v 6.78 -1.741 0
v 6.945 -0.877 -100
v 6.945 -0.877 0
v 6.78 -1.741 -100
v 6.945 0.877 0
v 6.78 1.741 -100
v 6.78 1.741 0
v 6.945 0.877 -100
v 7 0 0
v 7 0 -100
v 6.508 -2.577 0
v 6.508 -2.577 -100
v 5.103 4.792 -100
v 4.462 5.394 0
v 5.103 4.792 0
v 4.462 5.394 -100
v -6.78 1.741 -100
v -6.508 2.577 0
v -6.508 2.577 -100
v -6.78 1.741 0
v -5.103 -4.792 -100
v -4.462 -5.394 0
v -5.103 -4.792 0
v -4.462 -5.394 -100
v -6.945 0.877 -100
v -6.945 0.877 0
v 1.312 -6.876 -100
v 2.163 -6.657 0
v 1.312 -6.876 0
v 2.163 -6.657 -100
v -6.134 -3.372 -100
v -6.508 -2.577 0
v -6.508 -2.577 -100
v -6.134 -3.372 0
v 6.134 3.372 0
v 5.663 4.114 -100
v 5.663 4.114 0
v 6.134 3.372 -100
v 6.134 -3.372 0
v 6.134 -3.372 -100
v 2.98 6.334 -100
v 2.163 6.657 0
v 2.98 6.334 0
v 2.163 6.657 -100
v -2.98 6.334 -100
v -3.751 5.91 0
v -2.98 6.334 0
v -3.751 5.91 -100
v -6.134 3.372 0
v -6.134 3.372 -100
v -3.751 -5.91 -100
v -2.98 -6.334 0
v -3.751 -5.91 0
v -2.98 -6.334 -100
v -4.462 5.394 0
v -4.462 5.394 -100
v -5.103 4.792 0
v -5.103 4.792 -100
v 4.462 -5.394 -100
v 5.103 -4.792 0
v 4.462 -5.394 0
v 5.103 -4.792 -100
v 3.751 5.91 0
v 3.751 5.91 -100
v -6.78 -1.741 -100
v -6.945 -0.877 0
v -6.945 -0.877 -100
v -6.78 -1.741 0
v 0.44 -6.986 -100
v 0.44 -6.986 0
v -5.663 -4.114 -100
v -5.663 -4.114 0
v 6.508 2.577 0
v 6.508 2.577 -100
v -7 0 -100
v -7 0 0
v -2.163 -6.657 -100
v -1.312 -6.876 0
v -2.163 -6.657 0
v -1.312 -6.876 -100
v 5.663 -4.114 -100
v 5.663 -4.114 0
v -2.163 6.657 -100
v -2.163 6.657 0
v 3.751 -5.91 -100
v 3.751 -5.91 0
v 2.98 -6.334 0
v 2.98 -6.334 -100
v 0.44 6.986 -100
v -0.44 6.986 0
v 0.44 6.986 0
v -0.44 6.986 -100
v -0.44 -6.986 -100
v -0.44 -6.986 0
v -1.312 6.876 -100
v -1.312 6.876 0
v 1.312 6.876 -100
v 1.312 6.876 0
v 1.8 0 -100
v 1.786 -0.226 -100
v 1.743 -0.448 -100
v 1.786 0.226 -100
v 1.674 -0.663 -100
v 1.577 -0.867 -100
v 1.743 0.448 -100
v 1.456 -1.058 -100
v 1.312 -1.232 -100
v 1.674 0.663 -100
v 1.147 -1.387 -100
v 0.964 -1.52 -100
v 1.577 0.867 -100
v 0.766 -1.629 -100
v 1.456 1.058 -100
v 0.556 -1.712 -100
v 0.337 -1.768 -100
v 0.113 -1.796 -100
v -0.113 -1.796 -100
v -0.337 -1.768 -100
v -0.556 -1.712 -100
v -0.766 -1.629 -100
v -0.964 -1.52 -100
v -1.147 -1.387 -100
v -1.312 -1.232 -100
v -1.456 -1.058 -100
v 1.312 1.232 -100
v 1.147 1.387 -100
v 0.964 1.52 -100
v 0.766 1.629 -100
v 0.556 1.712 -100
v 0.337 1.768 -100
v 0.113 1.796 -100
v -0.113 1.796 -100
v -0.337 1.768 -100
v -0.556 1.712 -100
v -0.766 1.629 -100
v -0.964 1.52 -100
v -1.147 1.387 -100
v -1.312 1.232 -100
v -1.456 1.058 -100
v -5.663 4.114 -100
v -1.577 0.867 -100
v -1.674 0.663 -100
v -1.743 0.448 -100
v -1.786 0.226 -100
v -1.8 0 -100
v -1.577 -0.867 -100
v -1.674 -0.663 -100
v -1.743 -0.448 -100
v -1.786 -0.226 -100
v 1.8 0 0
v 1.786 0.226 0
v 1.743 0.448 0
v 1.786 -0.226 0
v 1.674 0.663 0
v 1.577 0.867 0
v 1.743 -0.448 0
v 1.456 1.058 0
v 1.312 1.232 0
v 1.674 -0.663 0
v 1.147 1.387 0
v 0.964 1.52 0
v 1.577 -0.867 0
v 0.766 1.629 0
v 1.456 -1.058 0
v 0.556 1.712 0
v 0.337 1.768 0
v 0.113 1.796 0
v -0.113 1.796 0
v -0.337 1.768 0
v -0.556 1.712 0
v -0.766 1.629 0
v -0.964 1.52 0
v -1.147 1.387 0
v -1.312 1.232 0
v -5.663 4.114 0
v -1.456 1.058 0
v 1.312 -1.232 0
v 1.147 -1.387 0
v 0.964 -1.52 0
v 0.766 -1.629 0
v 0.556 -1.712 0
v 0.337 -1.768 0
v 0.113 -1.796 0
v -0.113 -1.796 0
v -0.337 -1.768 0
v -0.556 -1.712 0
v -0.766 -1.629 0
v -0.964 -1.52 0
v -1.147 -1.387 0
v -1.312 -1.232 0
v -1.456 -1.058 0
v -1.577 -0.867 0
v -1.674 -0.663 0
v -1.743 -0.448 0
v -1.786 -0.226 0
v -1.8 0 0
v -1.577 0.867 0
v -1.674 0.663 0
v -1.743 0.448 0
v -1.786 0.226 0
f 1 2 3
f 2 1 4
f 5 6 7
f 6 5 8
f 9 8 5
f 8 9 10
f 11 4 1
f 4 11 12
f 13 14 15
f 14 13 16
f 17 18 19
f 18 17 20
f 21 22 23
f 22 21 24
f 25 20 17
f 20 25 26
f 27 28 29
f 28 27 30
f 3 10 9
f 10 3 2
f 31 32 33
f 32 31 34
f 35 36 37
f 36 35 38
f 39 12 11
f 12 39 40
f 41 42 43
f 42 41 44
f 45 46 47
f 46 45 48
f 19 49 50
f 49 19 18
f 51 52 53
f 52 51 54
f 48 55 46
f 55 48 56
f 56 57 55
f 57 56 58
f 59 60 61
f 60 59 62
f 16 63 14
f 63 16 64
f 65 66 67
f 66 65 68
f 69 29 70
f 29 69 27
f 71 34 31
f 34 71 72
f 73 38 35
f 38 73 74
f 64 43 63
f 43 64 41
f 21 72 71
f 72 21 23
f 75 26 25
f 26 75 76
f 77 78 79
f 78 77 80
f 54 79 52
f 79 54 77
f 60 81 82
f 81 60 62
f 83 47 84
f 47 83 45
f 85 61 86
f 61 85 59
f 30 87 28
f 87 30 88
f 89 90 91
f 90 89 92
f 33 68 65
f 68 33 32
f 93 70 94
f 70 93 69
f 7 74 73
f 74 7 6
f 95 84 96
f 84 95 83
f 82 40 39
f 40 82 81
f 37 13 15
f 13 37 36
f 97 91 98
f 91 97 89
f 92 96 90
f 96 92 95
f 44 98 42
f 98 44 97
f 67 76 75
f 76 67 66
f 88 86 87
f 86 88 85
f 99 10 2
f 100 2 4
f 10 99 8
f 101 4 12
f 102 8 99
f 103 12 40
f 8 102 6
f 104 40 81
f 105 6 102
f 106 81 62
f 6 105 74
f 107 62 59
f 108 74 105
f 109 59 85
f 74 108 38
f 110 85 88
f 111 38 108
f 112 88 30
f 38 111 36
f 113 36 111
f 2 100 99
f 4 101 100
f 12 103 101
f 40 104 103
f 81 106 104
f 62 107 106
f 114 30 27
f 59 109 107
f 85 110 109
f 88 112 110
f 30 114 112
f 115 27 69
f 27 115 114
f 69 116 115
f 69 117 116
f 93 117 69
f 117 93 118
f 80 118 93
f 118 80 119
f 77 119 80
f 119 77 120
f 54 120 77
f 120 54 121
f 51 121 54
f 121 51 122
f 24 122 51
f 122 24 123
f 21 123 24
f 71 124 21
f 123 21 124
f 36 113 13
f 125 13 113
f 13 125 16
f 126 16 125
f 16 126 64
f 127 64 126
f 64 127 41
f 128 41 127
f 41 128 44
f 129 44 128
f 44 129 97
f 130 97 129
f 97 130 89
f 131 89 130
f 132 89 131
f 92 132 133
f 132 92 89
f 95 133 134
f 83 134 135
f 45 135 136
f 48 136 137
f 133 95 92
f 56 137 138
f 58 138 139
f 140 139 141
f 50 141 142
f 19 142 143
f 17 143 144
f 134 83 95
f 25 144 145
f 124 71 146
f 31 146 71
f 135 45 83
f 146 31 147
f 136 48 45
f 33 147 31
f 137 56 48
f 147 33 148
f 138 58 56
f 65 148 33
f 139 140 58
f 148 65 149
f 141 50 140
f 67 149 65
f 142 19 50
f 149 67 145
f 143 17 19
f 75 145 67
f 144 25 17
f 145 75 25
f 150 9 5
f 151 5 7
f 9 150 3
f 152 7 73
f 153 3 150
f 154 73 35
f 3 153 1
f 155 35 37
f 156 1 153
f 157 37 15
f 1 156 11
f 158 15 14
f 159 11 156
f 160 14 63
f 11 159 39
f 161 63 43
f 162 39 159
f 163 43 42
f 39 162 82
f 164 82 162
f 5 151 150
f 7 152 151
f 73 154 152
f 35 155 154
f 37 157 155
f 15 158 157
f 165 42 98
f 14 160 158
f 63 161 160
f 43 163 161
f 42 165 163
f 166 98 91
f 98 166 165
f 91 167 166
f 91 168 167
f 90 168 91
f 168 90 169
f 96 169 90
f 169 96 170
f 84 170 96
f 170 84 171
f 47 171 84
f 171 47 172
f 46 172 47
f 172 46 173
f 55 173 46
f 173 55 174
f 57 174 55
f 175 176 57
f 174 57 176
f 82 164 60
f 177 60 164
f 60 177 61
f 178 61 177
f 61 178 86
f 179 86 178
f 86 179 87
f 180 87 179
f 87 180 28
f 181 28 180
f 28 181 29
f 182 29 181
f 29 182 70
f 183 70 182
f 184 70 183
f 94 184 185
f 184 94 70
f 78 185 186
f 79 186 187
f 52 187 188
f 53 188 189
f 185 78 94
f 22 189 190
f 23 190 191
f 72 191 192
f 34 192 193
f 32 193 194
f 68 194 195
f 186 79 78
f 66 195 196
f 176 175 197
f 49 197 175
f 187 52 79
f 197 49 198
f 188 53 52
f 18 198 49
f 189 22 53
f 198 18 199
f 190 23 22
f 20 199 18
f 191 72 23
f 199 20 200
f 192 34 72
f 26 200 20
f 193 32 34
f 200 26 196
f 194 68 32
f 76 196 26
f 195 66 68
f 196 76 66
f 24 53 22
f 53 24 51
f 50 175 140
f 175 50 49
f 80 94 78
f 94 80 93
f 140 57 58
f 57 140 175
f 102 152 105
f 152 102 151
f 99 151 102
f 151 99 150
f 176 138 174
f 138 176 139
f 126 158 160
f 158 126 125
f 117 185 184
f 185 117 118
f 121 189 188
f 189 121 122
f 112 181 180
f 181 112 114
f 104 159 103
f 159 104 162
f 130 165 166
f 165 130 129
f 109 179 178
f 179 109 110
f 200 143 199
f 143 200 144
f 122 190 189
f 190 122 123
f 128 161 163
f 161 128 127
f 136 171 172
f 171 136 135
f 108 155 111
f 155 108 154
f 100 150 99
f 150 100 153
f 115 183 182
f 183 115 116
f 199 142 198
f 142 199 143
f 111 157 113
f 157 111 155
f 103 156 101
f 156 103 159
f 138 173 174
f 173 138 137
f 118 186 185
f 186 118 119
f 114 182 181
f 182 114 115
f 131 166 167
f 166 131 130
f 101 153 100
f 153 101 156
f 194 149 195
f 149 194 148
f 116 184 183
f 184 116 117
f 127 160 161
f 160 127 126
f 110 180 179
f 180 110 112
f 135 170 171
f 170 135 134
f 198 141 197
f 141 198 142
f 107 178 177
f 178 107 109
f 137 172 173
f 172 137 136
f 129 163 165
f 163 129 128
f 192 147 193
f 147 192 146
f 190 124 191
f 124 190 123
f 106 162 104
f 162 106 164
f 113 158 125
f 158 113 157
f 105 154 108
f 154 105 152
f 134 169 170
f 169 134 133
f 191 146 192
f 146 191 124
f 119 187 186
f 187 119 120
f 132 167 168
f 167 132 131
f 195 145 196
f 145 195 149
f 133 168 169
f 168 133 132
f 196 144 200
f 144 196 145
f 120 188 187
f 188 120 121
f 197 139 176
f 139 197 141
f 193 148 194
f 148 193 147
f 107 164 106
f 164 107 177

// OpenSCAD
$fn = 50;


difference() {
	union() {
		translate(v = [0, 0, -100.0000000000]) {
			cylinder(h = 100, r = 7.0000000000);
		}
	}
	union() {
		#translate(v = [0, 0, -100]) {
			cylinder(h = 100, r = 1.8000000000);
		}
	}
}
